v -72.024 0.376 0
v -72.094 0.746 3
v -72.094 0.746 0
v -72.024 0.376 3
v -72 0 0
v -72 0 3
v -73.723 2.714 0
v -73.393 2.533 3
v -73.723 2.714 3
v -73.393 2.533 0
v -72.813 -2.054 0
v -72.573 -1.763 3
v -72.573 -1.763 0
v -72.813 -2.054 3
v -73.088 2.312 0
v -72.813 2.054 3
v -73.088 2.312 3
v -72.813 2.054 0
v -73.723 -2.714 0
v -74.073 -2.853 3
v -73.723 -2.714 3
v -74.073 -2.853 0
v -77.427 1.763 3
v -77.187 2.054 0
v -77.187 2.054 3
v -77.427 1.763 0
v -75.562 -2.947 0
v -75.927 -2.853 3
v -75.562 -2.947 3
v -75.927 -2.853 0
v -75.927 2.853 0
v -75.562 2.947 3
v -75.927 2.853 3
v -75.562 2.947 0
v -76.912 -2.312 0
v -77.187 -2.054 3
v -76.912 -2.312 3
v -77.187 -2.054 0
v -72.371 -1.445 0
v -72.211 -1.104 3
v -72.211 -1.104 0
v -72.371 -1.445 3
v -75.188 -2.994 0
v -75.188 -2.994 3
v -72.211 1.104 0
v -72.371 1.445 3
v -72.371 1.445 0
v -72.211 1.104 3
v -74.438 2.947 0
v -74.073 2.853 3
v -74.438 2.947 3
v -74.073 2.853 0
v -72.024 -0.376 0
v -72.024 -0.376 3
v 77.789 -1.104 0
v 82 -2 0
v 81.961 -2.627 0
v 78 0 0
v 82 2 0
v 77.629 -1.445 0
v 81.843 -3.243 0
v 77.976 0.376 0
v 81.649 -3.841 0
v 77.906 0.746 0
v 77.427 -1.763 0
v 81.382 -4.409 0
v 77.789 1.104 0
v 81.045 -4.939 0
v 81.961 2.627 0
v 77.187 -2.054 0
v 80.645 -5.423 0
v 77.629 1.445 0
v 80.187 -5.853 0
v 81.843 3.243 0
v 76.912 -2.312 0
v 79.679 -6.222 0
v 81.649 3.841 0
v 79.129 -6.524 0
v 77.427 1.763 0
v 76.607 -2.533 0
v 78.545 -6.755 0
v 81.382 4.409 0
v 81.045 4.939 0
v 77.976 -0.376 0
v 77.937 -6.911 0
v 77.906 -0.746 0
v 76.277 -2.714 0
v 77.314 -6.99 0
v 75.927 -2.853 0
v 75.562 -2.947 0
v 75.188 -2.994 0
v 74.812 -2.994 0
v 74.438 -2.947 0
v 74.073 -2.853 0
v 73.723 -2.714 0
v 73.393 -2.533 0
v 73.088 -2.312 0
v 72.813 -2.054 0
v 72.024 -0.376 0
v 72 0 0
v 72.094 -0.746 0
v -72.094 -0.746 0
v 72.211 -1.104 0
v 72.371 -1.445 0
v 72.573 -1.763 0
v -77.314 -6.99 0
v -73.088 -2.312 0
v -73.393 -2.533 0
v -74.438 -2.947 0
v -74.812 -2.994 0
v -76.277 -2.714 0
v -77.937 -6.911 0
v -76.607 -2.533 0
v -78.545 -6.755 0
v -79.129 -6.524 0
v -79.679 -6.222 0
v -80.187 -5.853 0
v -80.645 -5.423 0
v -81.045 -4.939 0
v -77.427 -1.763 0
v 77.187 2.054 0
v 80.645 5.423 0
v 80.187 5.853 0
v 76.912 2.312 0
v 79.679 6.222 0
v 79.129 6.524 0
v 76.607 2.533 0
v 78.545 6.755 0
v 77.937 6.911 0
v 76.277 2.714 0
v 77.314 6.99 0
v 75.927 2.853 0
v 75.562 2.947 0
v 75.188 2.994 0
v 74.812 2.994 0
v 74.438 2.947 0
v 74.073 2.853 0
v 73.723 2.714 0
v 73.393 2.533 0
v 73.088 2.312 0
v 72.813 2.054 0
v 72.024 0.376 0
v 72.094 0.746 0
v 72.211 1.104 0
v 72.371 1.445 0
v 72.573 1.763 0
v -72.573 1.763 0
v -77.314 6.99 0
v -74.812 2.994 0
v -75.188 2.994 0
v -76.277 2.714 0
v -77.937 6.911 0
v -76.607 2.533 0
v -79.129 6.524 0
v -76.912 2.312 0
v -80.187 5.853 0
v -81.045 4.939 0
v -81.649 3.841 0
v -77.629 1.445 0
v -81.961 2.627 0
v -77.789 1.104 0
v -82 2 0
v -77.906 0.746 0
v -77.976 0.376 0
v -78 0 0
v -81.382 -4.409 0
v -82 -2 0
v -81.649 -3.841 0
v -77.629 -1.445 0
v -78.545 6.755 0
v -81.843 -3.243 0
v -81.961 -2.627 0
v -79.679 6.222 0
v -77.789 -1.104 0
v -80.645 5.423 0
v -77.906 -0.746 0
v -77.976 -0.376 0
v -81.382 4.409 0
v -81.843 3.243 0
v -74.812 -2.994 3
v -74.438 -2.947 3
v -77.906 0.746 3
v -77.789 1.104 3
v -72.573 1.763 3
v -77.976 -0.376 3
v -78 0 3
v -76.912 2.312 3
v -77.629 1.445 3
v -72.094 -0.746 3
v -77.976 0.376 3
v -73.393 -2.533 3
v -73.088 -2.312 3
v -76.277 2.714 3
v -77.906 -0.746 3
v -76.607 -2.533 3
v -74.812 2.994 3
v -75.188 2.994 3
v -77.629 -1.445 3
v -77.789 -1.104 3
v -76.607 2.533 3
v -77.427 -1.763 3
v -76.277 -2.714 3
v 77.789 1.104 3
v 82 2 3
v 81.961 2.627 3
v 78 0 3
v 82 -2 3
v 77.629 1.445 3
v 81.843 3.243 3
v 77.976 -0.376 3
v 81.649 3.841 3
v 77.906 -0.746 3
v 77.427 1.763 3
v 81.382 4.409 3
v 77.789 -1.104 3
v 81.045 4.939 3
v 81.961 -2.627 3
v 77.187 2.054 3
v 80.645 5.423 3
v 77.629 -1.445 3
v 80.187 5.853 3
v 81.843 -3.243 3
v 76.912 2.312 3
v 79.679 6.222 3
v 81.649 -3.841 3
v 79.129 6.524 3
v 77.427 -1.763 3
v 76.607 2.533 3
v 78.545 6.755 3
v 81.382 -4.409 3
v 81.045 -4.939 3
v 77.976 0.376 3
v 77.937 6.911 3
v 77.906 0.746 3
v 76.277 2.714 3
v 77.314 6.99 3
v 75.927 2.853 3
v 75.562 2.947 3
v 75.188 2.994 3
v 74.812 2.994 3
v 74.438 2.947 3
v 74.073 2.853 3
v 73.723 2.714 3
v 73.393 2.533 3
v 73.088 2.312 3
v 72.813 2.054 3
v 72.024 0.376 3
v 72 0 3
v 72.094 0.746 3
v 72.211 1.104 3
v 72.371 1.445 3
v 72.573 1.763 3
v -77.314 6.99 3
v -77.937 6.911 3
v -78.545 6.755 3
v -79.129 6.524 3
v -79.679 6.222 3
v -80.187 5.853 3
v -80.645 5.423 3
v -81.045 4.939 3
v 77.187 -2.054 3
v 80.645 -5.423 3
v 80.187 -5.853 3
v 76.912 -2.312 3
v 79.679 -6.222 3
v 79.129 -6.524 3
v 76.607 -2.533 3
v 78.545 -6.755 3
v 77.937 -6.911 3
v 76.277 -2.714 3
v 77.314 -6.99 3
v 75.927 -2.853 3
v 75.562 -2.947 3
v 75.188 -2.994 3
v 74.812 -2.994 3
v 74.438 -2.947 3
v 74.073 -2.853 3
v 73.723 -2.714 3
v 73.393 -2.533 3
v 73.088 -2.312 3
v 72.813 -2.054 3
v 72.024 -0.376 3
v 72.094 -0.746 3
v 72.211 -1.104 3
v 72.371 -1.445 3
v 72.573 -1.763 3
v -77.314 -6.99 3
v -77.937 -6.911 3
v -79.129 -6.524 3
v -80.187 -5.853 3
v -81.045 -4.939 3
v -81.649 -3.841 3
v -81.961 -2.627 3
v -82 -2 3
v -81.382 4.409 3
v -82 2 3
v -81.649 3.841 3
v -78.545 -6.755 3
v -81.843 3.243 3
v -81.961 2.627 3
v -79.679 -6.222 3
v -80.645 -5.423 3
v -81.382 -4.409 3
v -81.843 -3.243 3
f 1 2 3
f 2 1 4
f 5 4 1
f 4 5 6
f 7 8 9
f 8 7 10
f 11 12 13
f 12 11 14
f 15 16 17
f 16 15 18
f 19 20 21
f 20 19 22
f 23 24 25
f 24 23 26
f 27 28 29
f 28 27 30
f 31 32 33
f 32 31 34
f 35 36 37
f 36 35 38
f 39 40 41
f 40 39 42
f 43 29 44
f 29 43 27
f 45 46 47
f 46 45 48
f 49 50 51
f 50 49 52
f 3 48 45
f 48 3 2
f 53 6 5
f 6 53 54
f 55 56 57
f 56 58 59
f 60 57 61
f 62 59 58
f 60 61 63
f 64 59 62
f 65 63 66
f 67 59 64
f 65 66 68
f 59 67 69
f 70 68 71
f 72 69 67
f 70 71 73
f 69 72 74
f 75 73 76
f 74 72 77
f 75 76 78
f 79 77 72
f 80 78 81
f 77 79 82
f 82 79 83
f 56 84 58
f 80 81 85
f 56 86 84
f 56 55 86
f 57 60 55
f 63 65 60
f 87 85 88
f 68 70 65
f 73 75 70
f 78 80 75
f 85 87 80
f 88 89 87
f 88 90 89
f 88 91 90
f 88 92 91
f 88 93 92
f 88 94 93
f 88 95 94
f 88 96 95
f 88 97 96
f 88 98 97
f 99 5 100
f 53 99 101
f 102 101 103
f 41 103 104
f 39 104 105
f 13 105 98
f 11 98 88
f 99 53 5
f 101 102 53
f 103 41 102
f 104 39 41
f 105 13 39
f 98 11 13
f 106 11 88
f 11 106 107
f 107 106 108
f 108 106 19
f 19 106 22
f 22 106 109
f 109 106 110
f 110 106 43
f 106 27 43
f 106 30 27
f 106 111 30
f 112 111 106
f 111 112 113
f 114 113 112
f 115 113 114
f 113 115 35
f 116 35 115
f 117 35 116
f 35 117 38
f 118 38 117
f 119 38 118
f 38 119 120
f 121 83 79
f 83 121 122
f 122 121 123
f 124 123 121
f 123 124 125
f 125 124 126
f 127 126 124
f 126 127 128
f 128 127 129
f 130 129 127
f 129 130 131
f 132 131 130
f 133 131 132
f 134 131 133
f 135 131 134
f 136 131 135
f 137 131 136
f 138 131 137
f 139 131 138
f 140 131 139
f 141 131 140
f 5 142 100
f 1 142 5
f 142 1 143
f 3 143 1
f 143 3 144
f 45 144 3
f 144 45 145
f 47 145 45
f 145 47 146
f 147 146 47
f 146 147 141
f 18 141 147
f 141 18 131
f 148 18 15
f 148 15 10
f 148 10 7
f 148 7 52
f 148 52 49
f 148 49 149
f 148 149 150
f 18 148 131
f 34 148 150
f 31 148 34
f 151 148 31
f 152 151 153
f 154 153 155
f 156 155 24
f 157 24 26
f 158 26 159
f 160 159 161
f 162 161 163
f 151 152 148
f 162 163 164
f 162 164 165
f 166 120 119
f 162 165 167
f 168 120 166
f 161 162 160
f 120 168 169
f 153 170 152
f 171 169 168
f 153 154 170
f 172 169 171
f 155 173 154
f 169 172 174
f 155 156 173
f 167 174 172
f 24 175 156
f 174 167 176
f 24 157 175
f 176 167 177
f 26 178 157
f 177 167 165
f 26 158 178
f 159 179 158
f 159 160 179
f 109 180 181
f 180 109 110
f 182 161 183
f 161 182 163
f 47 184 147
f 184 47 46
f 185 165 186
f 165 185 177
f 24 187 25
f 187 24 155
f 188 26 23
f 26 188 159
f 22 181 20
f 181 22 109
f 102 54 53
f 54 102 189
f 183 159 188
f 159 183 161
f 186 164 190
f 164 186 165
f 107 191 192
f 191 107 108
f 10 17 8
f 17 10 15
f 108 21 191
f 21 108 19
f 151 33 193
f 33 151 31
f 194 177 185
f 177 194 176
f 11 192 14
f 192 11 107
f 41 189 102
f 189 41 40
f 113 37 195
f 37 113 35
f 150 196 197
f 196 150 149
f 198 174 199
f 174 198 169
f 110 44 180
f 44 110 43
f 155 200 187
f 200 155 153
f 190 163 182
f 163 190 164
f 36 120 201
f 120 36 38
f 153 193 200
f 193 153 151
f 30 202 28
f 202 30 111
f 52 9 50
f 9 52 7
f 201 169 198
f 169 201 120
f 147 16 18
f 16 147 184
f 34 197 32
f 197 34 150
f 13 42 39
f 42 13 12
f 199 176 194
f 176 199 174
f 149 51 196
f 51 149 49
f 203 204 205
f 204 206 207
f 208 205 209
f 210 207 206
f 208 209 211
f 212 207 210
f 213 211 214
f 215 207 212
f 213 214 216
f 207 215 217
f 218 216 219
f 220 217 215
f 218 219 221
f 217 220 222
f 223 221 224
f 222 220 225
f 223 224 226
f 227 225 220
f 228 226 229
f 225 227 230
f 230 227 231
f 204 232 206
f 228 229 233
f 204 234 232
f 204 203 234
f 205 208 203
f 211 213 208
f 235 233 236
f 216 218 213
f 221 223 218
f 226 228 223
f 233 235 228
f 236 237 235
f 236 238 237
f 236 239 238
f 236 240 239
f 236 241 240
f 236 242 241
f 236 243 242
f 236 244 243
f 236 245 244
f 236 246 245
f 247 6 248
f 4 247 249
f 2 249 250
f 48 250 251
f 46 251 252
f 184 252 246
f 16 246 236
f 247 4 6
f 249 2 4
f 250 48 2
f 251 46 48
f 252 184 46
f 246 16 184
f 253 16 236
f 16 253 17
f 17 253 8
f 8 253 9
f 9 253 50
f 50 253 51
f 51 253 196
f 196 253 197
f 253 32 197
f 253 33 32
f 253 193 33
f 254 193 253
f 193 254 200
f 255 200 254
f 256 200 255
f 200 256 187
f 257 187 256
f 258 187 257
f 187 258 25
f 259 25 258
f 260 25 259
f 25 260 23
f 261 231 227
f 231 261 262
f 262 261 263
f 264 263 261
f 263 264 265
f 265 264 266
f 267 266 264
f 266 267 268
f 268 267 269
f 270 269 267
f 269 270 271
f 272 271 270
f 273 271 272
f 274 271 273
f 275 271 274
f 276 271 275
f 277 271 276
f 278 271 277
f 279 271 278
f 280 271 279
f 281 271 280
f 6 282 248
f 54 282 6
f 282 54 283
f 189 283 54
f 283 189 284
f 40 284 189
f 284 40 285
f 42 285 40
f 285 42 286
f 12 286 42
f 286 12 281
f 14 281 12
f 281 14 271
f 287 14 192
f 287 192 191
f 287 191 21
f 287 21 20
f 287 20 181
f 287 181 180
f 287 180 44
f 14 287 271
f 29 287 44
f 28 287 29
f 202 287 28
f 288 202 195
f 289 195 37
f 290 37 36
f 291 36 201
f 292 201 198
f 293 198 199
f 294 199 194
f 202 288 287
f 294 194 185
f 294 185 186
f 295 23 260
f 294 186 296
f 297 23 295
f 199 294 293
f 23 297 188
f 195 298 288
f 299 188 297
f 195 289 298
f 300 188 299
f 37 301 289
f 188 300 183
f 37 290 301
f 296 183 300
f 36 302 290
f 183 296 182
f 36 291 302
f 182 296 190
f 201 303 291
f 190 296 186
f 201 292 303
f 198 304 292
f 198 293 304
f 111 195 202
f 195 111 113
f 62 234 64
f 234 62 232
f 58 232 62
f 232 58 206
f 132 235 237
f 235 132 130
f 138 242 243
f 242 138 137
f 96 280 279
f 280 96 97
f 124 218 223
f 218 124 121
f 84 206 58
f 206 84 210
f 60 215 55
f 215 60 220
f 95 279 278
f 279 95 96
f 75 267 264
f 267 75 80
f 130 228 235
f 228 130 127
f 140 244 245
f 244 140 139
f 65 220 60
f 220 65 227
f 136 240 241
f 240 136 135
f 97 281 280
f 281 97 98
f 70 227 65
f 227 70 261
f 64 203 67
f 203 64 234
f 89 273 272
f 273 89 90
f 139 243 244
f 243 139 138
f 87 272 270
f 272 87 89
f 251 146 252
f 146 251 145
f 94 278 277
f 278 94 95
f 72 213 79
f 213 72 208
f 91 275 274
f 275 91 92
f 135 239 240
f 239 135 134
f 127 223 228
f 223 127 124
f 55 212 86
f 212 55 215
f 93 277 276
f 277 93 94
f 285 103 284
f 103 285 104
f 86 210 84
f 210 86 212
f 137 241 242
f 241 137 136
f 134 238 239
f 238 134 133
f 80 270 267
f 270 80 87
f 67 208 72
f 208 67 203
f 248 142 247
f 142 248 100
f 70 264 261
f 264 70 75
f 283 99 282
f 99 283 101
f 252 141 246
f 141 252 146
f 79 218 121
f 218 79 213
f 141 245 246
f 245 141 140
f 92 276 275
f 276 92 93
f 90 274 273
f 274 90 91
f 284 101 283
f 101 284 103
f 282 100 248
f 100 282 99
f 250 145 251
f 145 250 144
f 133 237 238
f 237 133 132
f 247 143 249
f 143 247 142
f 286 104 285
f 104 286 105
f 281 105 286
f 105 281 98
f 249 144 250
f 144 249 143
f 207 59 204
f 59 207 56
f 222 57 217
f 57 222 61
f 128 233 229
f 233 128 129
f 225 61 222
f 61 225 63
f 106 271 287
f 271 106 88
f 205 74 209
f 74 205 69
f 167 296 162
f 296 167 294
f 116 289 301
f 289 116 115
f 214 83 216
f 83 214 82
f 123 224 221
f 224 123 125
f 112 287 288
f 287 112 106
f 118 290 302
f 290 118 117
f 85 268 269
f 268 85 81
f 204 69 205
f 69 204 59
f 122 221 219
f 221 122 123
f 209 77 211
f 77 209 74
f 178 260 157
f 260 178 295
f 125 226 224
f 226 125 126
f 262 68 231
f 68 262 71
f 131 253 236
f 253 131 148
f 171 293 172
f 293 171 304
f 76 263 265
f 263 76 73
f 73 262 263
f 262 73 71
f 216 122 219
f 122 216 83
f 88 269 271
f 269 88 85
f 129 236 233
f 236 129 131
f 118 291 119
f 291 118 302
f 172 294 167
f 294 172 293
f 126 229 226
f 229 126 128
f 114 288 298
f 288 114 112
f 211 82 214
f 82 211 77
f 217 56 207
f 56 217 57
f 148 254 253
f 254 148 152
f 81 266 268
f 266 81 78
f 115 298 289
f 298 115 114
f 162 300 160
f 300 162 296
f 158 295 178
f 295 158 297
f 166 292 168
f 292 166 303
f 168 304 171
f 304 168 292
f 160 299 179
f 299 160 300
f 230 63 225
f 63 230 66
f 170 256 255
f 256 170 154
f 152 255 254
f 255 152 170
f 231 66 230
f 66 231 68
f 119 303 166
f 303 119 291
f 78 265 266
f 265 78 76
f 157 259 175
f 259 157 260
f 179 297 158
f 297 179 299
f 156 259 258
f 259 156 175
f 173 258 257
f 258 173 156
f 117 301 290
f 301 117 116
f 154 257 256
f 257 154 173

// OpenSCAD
$fn = 50;


difference() {
	union() {
		hull() {
			translate(v = [-77.0000000000, 2.0000000000, 0]) {
				cylinder(h = 3, r = 5);
			}
			translate(v = [77.0000000000, 2.0000000000, 0]) {
				cylinder(h = 3, r = 5);
			}
			translate(v = [-77.0000000000, -2.0000000000, 0]) {
				cylinder(h = 3, r = 5);
			}
			translate(v = [77.0000000000, -2.0000000000, 0]) {
				cylinder(h = 3, r = 5);
			}
		}
	}
	union() {
		translate(v = [-75.0000000000, 0.0000000000, 0]) {
			cylinder(h = 3, r = 3.0000000000);
		}
		translate(v = [75.0000000000, 0.0000000000, 0]) {
			cylinder(h = 3, r = 3.0000000000);
		}
		translate(v = [-75.0000000000, 0.0000000000, 0]) {
			cylinder(h = 3, r = 1.5000000000);
		}
		translate(v = [75.0000000000, 0.0000000000, 0]) {
			cylinder(h = 3, r = 1.5000000000);
		}
		translate(v = [-75.0000000000, 0.0000000000, 0]) {
			cylinder(h = 3, r = 1.5000000000);
		}
		translate(v = [75.0000000000, 0.0000000000, 0]) {
			cylinder(h = 3, r = 1.5000000000);
		}
		translate(v = [-75.0000000000, 0.0000000000, 0]) {
			cylinder(h = 3, r = 1.5000000000);
		}
		translate(v = [75.0000000000, 0.0000000000, 0]) {
			cylinder(h = 3, r = 1.5000000000);
		}
	}
}
